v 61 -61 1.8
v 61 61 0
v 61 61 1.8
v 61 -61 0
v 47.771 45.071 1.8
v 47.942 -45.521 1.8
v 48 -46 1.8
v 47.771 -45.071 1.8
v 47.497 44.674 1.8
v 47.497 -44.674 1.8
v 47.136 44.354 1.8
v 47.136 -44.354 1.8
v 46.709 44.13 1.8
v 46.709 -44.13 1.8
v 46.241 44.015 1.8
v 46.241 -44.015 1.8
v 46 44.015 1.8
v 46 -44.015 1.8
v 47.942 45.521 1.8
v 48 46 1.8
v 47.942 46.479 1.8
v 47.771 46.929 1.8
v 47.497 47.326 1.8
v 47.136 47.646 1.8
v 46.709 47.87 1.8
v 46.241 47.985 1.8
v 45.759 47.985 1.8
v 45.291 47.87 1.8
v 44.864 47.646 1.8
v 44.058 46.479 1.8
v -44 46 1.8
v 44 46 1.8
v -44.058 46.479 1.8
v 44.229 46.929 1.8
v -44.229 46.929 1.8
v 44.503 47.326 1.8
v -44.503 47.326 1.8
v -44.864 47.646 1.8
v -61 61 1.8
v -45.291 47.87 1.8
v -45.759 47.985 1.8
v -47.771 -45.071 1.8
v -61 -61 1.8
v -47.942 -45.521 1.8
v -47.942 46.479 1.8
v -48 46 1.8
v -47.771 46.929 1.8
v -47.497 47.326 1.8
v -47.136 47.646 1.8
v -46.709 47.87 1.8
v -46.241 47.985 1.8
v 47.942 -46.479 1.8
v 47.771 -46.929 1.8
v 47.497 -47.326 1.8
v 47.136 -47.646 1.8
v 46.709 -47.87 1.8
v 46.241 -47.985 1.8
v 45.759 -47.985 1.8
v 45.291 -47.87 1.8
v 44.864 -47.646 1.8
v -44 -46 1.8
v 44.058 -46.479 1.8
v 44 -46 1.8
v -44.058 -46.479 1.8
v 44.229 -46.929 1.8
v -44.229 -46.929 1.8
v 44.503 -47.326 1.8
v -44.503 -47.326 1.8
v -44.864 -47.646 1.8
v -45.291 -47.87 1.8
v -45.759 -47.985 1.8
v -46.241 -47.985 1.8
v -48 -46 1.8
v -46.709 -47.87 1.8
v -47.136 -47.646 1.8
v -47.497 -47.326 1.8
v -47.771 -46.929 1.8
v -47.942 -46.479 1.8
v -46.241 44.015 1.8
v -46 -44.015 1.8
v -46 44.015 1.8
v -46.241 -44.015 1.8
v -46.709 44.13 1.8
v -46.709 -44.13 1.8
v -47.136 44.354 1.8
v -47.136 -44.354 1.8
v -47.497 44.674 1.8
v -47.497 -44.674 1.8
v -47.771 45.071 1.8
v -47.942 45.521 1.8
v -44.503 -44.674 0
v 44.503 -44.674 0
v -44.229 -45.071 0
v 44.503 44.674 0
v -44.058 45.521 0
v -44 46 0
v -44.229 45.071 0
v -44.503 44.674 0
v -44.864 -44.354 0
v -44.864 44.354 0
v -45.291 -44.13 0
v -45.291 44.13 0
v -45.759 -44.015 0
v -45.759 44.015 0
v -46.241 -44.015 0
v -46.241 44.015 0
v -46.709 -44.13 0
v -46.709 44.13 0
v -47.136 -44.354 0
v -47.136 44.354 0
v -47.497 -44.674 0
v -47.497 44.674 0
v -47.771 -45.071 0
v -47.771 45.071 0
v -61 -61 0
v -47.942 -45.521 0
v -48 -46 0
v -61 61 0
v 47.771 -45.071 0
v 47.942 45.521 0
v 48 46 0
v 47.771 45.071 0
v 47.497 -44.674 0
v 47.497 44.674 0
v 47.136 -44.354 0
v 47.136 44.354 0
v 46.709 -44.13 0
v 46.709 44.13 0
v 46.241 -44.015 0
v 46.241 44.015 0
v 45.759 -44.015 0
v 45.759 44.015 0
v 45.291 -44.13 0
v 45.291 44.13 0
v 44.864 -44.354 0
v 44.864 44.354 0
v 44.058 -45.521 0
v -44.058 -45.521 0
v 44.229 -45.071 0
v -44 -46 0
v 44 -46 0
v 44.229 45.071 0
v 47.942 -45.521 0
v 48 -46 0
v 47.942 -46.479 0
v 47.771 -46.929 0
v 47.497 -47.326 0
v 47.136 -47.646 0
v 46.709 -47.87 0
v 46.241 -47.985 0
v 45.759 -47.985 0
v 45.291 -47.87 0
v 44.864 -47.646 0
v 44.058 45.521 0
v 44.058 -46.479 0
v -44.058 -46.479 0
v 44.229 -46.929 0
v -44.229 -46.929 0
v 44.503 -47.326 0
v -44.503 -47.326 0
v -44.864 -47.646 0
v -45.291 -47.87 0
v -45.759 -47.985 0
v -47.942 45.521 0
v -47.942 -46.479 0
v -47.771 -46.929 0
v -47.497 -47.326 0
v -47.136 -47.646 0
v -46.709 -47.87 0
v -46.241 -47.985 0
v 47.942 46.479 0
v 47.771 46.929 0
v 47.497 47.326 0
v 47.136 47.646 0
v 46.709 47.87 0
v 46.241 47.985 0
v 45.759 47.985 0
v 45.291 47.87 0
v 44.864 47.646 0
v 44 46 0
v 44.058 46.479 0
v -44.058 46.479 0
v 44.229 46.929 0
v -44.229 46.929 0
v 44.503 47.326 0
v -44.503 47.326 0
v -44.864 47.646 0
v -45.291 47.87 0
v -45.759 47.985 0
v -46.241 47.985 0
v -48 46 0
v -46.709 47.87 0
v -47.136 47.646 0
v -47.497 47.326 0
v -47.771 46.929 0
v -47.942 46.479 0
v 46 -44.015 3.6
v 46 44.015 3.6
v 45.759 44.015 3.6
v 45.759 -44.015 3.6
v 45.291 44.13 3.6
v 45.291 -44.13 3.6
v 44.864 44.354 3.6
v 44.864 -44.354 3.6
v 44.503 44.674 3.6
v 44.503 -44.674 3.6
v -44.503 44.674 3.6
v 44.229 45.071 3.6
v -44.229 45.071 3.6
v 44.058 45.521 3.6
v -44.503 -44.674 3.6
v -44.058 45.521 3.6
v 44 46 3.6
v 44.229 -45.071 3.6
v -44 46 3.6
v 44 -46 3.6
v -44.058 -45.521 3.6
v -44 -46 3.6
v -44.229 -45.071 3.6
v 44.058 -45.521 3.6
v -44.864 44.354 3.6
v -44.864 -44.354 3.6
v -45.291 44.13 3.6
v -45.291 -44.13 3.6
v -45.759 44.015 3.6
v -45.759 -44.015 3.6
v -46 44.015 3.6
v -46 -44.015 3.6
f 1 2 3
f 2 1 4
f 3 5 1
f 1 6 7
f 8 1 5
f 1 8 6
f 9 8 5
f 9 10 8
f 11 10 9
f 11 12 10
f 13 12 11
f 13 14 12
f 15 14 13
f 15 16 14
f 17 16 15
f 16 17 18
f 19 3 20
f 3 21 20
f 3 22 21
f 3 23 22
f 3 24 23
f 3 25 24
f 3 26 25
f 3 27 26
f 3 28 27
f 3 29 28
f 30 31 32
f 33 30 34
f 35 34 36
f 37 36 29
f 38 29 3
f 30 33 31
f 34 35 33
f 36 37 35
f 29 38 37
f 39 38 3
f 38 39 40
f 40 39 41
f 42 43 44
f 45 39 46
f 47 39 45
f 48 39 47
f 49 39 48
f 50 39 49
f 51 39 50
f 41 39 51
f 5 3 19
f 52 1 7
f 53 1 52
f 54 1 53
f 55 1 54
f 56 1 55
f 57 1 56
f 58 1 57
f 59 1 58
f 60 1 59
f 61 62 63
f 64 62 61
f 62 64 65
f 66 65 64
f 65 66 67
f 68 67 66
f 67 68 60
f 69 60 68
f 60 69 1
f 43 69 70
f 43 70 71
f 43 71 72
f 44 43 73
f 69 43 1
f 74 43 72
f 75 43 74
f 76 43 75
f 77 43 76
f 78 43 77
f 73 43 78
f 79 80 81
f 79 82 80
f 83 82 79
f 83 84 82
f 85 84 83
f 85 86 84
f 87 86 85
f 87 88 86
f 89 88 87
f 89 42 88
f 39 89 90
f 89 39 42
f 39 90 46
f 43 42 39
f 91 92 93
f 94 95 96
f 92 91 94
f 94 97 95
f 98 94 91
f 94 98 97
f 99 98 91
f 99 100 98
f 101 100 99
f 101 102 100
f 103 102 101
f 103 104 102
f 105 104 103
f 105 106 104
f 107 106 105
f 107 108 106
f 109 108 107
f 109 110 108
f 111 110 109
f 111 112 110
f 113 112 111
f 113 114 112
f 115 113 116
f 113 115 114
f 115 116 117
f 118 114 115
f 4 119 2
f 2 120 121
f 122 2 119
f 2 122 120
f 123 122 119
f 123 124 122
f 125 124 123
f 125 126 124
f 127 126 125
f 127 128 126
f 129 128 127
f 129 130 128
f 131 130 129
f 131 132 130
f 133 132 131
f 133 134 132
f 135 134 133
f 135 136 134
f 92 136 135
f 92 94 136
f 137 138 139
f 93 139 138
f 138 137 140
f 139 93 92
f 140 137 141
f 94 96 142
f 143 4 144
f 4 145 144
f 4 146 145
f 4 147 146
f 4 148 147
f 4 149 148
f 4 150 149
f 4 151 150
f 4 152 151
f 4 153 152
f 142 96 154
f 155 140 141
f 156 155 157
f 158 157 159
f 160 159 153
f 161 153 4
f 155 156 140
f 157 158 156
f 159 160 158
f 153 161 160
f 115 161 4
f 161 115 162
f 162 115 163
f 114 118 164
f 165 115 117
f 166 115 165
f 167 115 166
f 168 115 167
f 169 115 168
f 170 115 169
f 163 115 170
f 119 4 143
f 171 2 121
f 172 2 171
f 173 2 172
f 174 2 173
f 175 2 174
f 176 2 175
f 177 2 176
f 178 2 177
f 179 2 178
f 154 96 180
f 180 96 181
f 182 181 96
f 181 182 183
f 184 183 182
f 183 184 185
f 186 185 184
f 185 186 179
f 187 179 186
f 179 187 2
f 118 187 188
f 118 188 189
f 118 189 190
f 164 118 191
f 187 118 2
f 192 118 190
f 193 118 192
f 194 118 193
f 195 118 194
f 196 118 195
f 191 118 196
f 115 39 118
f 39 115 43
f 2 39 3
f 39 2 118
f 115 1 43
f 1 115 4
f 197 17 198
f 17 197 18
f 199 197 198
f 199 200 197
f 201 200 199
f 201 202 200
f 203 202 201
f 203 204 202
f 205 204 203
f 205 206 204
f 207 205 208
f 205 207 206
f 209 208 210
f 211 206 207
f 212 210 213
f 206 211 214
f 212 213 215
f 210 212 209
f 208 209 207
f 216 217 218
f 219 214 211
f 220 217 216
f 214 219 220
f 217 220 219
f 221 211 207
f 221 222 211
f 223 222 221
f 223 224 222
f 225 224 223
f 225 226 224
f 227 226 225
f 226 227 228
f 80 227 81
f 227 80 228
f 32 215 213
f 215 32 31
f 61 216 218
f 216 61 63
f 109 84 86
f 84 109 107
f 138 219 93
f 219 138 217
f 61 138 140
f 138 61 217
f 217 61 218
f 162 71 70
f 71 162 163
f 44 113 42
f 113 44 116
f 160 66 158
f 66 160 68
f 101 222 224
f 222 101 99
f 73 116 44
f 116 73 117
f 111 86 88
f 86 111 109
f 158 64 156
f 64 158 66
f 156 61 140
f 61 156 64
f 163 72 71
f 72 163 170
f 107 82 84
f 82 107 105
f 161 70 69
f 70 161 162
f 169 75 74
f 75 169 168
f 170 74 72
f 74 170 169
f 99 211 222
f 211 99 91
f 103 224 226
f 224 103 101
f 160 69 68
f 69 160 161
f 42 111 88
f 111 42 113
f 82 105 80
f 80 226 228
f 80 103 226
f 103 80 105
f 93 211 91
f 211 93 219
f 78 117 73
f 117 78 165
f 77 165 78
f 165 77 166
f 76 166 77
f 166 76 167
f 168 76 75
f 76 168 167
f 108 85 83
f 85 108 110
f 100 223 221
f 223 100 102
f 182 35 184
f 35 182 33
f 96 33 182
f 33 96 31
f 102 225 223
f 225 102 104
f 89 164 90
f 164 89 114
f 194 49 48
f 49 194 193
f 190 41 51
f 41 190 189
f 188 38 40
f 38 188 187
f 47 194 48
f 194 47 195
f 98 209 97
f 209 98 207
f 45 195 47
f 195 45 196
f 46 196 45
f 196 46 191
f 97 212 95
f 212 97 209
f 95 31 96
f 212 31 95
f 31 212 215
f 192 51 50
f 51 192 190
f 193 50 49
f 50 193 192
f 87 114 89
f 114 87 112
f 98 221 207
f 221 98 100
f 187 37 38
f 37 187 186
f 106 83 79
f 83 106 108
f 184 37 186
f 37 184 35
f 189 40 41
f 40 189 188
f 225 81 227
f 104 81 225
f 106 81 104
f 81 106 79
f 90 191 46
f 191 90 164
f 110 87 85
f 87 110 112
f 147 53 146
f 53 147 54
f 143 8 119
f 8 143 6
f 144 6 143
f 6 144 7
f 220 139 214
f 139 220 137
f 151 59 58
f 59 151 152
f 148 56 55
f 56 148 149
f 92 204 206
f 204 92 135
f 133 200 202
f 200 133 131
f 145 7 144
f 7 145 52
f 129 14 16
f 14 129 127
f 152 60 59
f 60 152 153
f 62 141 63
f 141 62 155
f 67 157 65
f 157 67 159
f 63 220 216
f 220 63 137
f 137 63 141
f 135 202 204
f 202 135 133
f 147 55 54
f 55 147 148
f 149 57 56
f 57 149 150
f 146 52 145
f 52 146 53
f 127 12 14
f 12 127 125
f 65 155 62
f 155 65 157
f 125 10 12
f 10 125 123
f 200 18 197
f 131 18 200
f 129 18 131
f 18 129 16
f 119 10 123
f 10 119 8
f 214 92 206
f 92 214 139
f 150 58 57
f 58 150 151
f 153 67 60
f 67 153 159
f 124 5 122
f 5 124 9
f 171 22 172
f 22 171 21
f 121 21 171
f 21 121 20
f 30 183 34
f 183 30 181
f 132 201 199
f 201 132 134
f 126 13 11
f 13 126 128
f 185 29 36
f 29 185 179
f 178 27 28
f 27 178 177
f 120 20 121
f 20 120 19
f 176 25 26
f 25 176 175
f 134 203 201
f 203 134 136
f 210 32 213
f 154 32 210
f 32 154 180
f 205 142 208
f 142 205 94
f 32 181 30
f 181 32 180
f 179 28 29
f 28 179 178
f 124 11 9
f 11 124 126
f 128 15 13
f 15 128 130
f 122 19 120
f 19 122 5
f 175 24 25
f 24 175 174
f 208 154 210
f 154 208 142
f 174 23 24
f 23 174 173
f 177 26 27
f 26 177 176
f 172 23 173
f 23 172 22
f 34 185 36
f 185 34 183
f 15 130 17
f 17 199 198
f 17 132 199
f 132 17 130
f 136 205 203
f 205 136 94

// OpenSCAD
module cover (d1, h1, d2, h2, hole=4)
{
    difference () {
        union () {
            translate ([0, 0, h1 / 2])
                cube ([d1, d1, h1], center = true);
            translate ([0, 0, h2 / 2])
                cube ([d2, d2, h2], center = true);
        }
        for (x = [-d2/2, d2/2]) {
            for (y = [-d2/2, d2/2]) {
                translate ([x, y, 0])
                    cylinder (r = hole / 2, h = 4 * h2, center = true);
            }
        }
    }
}

cover (122, 1.8, 92, 3.6, $fa=3, $fs=.5);
